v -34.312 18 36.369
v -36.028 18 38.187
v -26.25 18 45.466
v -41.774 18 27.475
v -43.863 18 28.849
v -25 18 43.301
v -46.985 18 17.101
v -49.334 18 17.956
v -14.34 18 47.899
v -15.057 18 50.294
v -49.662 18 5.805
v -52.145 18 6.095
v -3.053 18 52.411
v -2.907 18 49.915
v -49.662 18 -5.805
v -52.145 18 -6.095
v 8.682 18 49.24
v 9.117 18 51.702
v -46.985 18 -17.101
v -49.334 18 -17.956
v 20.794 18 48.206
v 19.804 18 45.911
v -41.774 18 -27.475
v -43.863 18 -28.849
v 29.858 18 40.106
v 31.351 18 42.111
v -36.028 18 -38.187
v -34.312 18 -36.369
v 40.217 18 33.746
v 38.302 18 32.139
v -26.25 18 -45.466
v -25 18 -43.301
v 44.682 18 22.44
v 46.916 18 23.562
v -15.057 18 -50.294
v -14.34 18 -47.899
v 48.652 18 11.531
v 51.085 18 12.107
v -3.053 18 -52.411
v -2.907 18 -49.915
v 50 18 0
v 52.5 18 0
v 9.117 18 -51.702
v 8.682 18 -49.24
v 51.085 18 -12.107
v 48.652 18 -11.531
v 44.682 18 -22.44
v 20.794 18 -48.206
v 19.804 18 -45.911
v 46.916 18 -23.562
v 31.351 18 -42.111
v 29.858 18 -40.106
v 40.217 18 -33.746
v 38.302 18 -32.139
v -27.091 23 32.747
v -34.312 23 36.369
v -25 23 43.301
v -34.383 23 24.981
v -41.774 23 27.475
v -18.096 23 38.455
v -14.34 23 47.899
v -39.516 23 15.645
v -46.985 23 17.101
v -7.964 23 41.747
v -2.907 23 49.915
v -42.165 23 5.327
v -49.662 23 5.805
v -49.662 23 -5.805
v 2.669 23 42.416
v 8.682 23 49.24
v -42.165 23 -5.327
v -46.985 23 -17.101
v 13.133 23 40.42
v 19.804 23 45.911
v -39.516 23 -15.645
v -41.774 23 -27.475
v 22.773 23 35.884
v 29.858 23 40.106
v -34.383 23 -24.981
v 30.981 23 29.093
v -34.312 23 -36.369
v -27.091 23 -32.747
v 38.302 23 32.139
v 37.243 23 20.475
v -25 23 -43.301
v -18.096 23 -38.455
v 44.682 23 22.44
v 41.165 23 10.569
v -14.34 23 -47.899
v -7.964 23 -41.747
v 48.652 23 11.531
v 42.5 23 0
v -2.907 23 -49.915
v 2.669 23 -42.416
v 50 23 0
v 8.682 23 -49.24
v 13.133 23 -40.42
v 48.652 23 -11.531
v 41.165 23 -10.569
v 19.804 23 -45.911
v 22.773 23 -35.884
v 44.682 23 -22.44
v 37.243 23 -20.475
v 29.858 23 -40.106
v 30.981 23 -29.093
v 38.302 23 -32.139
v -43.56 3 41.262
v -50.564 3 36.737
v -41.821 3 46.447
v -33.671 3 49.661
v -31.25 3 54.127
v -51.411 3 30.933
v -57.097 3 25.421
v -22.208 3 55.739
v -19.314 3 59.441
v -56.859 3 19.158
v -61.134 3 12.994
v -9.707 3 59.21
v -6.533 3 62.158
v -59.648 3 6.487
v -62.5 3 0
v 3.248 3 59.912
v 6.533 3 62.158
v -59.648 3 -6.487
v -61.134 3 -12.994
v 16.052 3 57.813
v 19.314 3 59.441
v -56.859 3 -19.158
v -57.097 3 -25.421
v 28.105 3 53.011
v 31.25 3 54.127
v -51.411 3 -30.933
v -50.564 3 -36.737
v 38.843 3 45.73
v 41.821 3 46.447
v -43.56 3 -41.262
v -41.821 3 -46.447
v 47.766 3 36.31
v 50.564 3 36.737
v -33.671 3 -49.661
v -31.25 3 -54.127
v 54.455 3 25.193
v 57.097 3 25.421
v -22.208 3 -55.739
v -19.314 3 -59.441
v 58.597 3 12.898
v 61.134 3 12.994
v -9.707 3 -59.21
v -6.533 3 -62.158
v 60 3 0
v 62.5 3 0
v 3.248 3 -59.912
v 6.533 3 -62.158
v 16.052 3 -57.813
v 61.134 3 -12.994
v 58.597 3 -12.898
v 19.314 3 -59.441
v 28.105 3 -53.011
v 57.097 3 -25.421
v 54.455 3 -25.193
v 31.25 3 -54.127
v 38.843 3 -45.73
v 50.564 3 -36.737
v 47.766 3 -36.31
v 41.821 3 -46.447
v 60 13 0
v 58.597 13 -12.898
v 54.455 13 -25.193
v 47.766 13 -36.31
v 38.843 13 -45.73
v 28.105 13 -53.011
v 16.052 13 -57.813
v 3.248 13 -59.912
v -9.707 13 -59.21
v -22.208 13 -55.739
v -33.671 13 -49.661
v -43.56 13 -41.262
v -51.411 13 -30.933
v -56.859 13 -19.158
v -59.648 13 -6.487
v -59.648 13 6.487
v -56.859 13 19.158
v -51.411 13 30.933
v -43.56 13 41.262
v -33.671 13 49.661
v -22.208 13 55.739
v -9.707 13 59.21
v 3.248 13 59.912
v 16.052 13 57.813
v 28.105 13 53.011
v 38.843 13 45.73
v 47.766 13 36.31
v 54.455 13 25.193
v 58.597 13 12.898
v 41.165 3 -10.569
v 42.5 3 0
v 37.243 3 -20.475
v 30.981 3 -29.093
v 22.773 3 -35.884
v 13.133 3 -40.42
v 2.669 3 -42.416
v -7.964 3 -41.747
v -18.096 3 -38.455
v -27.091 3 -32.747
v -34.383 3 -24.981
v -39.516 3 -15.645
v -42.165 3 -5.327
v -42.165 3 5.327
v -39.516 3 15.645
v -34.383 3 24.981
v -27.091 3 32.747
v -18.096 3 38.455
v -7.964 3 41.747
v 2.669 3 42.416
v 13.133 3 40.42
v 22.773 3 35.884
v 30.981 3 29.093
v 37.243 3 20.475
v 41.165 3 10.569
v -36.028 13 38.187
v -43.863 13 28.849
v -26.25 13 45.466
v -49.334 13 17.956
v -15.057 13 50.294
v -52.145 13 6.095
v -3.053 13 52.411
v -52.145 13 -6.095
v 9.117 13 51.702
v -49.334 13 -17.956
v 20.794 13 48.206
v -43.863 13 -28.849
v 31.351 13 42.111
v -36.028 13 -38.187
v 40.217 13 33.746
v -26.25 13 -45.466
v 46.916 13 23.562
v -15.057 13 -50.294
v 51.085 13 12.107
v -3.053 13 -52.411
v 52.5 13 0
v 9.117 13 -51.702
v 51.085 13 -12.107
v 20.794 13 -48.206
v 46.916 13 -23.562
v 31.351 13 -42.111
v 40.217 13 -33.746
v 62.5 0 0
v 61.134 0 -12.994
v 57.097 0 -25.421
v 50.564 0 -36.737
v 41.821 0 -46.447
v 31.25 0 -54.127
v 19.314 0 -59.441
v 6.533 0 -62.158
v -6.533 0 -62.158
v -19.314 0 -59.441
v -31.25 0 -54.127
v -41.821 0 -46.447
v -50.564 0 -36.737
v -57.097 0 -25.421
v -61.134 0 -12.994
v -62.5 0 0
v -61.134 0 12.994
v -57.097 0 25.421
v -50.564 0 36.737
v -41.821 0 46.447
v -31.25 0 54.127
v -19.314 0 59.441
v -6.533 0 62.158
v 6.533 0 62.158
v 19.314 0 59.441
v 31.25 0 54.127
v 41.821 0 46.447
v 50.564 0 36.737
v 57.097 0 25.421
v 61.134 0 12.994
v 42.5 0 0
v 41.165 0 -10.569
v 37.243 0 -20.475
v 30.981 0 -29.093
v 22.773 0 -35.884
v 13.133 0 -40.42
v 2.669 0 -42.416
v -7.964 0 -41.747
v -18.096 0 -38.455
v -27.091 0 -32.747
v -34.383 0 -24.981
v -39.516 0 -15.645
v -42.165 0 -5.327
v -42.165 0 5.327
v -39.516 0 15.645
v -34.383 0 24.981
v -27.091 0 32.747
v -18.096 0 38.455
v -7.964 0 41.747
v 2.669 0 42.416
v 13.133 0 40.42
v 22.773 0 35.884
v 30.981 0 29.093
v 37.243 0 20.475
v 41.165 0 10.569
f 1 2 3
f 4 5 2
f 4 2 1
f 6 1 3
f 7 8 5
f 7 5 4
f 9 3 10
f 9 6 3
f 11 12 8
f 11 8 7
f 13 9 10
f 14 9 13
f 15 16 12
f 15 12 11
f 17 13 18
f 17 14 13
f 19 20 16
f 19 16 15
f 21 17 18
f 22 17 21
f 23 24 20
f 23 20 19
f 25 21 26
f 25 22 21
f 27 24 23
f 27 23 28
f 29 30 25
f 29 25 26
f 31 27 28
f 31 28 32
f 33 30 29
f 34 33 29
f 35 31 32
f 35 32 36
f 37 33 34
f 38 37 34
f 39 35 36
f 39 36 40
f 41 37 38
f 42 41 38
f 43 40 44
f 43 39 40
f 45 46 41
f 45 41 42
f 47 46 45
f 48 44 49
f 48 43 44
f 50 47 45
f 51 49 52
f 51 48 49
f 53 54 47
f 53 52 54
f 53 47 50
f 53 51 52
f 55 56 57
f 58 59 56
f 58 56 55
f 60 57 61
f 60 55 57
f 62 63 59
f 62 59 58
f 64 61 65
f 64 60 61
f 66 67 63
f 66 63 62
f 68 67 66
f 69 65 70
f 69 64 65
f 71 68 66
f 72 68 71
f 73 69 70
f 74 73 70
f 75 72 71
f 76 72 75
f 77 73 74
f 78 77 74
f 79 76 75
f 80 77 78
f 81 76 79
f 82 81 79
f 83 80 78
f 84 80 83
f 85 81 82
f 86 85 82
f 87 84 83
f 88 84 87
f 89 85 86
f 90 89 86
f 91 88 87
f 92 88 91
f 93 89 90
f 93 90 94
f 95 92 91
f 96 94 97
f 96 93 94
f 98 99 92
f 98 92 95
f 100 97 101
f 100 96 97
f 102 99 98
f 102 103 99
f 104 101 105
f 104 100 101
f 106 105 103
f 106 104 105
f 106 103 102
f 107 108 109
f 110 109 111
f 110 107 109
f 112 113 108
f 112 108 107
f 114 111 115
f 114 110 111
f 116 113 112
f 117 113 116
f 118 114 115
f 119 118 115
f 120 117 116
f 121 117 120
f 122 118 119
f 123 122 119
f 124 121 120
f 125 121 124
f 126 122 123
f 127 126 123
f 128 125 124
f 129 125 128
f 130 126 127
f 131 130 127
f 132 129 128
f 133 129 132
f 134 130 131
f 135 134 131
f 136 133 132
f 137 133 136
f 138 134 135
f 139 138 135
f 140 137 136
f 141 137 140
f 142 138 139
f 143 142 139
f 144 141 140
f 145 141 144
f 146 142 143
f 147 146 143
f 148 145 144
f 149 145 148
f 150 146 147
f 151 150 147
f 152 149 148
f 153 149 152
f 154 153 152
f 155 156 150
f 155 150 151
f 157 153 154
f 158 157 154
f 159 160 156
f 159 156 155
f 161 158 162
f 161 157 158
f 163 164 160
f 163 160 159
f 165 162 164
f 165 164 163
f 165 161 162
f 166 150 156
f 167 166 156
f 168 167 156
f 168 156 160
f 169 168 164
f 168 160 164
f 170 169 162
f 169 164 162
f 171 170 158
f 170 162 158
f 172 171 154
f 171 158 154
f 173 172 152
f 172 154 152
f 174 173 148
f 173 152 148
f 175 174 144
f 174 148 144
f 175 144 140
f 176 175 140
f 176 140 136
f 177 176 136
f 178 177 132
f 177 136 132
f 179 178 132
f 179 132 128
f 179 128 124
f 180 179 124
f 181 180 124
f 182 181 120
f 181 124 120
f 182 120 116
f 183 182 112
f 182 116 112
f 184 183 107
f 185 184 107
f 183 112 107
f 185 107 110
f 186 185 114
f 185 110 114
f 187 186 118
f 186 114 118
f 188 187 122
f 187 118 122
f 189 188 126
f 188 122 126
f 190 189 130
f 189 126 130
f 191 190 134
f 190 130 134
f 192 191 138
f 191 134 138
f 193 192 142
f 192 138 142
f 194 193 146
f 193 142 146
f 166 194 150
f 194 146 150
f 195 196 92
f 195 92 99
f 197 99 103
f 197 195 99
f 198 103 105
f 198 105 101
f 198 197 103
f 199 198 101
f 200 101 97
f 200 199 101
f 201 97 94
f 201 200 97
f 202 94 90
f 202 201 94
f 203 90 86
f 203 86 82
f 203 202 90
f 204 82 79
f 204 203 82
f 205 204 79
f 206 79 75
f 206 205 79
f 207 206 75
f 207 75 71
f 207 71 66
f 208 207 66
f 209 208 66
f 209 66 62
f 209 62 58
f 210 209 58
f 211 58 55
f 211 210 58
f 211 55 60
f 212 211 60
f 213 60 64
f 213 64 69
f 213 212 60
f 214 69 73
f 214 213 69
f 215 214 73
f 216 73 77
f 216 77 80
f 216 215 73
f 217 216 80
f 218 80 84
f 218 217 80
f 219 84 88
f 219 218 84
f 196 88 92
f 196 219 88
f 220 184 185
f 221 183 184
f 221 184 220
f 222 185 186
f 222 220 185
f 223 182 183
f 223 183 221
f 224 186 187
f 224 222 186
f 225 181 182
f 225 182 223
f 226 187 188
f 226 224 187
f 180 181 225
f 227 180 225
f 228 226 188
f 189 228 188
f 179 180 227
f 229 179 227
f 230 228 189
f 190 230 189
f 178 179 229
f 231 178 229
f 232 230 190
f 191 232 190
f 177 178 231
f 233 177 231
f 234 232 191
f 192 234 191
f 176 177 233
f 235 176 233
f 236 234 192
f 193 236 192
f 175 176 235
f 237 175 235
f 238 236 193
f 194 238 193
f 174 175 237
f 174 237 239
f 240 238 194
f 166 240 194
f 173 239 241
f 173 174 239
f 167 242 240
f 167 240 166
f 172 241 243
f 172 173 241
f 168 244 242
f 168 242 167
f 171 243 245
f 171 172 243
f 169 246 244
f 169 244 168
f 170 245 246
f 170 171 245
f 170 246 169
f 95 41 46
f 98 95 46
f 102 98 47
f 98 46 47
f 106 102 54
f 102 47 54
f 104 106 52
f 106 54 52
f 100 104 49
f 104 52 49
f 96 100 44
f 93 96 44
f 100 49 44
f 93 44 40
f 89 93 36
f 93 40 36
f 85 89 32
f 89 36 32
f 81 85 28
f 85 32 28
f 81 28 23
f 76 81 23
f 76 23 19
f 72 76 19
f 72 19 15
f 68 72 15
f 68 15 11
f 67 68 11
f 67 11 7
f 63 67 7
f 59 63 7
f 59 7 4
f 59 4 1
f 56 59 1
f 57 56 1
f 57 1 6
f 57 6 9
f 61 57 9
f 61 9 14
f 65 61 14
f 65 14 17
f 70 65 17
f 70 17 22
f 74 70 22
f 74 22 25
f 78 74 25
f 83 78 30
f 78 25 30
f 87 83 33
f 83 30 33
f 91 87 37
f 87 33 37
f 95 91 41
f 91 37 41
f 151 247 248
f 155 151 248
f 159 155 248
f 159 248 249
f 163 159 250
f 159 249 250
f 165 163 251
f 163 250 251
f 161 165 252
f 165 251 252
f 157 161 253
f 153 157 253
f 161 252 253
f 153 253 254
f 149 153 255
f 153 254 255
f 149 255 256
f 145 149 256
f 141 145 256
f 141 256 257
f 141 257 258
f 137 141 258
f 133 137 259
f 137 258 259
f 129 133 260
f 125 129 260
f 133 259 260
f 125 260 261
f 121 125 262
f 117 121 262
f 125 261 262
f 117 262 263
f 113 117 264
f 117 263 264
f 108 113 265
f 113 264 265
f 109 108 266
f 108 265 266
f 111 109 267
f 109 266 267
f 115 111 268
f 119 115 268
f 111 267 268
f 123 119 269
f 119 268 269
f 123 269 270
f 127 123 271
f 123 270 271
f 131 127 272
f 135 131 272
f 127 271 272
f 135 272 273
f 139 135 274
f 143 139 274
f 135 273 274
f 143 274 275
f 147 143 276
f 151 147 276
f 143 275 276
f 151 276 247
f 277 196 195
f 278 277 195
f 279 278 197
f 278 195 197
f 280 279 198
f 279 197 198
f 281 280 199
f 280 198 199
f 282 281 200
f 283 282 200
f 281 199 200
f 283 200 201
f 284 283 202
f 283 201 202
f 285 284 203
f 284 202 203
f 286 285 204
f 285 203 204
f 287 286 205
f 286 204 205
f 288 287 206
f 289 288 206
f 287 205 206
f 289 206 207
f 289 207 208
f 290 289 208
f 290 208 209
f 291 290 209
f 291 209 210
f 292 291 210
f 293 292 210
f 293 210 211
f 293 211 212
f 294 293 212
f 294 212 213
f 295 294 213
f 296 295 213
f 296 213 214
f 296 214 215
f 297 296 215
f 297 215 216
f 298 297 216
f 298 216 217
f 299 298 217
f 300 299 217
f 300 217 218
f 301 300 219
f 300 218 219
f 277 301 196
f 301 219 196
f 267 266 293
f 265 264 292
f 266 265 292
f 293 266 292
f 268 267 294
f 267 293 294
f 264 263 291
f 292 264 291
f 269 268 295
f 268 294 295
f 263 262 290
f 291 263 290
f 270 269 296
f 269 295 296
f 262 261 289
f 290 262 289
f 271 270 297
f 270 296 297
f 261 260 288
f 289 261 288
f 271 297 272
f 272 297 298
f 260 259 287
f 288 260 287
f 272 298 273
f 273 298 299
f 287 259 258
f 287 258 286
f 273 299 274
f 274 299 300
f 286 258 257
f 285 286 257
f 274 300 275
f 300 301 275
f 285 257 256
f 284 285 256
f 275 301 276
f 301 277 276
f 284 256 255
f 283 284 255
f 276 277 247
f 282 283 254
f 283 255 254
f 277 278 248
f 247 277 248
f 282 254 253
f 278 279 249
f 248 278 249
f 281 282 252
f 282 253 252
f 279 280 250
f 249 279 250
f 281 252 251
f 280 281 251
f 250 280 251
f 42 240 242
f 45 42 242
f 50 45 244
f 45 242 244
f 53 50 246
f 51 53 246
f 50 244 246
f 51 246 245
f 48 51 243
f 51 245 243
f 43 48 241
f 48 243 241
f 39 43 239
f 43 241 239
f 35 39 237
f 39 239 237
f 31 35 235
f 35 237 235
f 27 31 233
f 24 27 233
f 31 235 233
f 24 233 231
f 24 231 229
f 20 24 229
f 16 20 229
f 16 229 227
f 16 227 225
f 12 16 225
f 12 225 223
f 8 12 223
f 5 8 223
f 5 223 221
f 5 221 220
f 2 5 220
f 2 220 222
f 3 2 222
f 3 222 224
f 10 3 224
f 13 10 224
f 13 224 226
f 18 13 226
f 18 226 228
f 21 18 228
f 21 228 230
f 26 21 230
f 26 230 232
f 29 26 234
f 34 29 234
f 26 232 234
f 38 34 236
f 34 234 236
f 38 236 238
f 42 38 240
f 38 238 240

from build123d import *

# Parameters (mm, degrees)
SKETCH1_R           = 62.5
BOSS_EXTRUDE1_DEPTH = 3
SKETCH2_R           = 60
SKETCH2_R_2         = 52.5
BOSS_EXTRUDE2_DEPTH = 10
SKETCH3_R           = 52.5
SKETCH3_R_2         = 50
BOSS_EXTRUDE3_DEPTH = 15
SKETCH4_R           = 50
SKETCH4_R_2         = 42.5
BOSS_EXTRUDE4_DEPTH = 20
SKETCH5_R           = 42.5
CUT_EXTRUDE1_DEPTH  = 4


with BuildPart() as part:
    # Sketch1 → Boss-Extrude1 (new body)
    with BuildSketch(Plane(origin=(0, 0, 0), x_dir=(1, 0, 0), z_dir=(0, 1, 0))):
        Circle(SKETCH1_R)
    extrude(amount=BOSS_EXTRUDE1_DEPTH)

    # Sketch2 → Boss-Extrude2 (add)
    with BuildSketch(Plane(origin=(0, 3, 0), x_dir=(1, 0, 0), z_dir=(0, 1, 0))):
        Circle(SKETCH2_R)
        Circle(SKETCH2_R_2, mode=Mode.SUBTRACT)
    extrude(amount=BOSS_EXTRUDE2_DEPTH)

    # Sketch3 → Boss-Extrude3 (add)
    with BuildSketch(Plane(origin=(0, 3, 0), x_dir=(1, 0, 0), z_dir=(0, 1, 0))):
        Circle(SKETCH3_R)
        Circle(SKETCH3_R_2, mode=Mode.SUBTRACT)
    extrude(amount=BOSS_EXTRUDE3_DEPTH)

    # Sketch4 → Boss-Extrude4 (add)
    with BuildSketch(Plane(origin=(0, 3, 0), x_dir=(1, 0, 0), z_dir=(0, 1, 0))):
        Circle(SKETCH4_R)
        Circle(SKETCH4_R_2, mode=Mode.SUBTRACT)
    extrude(amount=BOSS_EXTRUDE4_DEPTH)

    # Sketch5 → Cut-Extrude1 (cut, through all)
    with BuildSketch(Plane(origin=(0, 3, 0), x_dir=(1, 0, 0), z_dir=(0, 1, 0))):
        Circle(SKETCH5_R)
    extrude(amount=-CUT_EXTRUDE1_DEPTH, mode=Mode.SUBTRACT)


solid = part.part
